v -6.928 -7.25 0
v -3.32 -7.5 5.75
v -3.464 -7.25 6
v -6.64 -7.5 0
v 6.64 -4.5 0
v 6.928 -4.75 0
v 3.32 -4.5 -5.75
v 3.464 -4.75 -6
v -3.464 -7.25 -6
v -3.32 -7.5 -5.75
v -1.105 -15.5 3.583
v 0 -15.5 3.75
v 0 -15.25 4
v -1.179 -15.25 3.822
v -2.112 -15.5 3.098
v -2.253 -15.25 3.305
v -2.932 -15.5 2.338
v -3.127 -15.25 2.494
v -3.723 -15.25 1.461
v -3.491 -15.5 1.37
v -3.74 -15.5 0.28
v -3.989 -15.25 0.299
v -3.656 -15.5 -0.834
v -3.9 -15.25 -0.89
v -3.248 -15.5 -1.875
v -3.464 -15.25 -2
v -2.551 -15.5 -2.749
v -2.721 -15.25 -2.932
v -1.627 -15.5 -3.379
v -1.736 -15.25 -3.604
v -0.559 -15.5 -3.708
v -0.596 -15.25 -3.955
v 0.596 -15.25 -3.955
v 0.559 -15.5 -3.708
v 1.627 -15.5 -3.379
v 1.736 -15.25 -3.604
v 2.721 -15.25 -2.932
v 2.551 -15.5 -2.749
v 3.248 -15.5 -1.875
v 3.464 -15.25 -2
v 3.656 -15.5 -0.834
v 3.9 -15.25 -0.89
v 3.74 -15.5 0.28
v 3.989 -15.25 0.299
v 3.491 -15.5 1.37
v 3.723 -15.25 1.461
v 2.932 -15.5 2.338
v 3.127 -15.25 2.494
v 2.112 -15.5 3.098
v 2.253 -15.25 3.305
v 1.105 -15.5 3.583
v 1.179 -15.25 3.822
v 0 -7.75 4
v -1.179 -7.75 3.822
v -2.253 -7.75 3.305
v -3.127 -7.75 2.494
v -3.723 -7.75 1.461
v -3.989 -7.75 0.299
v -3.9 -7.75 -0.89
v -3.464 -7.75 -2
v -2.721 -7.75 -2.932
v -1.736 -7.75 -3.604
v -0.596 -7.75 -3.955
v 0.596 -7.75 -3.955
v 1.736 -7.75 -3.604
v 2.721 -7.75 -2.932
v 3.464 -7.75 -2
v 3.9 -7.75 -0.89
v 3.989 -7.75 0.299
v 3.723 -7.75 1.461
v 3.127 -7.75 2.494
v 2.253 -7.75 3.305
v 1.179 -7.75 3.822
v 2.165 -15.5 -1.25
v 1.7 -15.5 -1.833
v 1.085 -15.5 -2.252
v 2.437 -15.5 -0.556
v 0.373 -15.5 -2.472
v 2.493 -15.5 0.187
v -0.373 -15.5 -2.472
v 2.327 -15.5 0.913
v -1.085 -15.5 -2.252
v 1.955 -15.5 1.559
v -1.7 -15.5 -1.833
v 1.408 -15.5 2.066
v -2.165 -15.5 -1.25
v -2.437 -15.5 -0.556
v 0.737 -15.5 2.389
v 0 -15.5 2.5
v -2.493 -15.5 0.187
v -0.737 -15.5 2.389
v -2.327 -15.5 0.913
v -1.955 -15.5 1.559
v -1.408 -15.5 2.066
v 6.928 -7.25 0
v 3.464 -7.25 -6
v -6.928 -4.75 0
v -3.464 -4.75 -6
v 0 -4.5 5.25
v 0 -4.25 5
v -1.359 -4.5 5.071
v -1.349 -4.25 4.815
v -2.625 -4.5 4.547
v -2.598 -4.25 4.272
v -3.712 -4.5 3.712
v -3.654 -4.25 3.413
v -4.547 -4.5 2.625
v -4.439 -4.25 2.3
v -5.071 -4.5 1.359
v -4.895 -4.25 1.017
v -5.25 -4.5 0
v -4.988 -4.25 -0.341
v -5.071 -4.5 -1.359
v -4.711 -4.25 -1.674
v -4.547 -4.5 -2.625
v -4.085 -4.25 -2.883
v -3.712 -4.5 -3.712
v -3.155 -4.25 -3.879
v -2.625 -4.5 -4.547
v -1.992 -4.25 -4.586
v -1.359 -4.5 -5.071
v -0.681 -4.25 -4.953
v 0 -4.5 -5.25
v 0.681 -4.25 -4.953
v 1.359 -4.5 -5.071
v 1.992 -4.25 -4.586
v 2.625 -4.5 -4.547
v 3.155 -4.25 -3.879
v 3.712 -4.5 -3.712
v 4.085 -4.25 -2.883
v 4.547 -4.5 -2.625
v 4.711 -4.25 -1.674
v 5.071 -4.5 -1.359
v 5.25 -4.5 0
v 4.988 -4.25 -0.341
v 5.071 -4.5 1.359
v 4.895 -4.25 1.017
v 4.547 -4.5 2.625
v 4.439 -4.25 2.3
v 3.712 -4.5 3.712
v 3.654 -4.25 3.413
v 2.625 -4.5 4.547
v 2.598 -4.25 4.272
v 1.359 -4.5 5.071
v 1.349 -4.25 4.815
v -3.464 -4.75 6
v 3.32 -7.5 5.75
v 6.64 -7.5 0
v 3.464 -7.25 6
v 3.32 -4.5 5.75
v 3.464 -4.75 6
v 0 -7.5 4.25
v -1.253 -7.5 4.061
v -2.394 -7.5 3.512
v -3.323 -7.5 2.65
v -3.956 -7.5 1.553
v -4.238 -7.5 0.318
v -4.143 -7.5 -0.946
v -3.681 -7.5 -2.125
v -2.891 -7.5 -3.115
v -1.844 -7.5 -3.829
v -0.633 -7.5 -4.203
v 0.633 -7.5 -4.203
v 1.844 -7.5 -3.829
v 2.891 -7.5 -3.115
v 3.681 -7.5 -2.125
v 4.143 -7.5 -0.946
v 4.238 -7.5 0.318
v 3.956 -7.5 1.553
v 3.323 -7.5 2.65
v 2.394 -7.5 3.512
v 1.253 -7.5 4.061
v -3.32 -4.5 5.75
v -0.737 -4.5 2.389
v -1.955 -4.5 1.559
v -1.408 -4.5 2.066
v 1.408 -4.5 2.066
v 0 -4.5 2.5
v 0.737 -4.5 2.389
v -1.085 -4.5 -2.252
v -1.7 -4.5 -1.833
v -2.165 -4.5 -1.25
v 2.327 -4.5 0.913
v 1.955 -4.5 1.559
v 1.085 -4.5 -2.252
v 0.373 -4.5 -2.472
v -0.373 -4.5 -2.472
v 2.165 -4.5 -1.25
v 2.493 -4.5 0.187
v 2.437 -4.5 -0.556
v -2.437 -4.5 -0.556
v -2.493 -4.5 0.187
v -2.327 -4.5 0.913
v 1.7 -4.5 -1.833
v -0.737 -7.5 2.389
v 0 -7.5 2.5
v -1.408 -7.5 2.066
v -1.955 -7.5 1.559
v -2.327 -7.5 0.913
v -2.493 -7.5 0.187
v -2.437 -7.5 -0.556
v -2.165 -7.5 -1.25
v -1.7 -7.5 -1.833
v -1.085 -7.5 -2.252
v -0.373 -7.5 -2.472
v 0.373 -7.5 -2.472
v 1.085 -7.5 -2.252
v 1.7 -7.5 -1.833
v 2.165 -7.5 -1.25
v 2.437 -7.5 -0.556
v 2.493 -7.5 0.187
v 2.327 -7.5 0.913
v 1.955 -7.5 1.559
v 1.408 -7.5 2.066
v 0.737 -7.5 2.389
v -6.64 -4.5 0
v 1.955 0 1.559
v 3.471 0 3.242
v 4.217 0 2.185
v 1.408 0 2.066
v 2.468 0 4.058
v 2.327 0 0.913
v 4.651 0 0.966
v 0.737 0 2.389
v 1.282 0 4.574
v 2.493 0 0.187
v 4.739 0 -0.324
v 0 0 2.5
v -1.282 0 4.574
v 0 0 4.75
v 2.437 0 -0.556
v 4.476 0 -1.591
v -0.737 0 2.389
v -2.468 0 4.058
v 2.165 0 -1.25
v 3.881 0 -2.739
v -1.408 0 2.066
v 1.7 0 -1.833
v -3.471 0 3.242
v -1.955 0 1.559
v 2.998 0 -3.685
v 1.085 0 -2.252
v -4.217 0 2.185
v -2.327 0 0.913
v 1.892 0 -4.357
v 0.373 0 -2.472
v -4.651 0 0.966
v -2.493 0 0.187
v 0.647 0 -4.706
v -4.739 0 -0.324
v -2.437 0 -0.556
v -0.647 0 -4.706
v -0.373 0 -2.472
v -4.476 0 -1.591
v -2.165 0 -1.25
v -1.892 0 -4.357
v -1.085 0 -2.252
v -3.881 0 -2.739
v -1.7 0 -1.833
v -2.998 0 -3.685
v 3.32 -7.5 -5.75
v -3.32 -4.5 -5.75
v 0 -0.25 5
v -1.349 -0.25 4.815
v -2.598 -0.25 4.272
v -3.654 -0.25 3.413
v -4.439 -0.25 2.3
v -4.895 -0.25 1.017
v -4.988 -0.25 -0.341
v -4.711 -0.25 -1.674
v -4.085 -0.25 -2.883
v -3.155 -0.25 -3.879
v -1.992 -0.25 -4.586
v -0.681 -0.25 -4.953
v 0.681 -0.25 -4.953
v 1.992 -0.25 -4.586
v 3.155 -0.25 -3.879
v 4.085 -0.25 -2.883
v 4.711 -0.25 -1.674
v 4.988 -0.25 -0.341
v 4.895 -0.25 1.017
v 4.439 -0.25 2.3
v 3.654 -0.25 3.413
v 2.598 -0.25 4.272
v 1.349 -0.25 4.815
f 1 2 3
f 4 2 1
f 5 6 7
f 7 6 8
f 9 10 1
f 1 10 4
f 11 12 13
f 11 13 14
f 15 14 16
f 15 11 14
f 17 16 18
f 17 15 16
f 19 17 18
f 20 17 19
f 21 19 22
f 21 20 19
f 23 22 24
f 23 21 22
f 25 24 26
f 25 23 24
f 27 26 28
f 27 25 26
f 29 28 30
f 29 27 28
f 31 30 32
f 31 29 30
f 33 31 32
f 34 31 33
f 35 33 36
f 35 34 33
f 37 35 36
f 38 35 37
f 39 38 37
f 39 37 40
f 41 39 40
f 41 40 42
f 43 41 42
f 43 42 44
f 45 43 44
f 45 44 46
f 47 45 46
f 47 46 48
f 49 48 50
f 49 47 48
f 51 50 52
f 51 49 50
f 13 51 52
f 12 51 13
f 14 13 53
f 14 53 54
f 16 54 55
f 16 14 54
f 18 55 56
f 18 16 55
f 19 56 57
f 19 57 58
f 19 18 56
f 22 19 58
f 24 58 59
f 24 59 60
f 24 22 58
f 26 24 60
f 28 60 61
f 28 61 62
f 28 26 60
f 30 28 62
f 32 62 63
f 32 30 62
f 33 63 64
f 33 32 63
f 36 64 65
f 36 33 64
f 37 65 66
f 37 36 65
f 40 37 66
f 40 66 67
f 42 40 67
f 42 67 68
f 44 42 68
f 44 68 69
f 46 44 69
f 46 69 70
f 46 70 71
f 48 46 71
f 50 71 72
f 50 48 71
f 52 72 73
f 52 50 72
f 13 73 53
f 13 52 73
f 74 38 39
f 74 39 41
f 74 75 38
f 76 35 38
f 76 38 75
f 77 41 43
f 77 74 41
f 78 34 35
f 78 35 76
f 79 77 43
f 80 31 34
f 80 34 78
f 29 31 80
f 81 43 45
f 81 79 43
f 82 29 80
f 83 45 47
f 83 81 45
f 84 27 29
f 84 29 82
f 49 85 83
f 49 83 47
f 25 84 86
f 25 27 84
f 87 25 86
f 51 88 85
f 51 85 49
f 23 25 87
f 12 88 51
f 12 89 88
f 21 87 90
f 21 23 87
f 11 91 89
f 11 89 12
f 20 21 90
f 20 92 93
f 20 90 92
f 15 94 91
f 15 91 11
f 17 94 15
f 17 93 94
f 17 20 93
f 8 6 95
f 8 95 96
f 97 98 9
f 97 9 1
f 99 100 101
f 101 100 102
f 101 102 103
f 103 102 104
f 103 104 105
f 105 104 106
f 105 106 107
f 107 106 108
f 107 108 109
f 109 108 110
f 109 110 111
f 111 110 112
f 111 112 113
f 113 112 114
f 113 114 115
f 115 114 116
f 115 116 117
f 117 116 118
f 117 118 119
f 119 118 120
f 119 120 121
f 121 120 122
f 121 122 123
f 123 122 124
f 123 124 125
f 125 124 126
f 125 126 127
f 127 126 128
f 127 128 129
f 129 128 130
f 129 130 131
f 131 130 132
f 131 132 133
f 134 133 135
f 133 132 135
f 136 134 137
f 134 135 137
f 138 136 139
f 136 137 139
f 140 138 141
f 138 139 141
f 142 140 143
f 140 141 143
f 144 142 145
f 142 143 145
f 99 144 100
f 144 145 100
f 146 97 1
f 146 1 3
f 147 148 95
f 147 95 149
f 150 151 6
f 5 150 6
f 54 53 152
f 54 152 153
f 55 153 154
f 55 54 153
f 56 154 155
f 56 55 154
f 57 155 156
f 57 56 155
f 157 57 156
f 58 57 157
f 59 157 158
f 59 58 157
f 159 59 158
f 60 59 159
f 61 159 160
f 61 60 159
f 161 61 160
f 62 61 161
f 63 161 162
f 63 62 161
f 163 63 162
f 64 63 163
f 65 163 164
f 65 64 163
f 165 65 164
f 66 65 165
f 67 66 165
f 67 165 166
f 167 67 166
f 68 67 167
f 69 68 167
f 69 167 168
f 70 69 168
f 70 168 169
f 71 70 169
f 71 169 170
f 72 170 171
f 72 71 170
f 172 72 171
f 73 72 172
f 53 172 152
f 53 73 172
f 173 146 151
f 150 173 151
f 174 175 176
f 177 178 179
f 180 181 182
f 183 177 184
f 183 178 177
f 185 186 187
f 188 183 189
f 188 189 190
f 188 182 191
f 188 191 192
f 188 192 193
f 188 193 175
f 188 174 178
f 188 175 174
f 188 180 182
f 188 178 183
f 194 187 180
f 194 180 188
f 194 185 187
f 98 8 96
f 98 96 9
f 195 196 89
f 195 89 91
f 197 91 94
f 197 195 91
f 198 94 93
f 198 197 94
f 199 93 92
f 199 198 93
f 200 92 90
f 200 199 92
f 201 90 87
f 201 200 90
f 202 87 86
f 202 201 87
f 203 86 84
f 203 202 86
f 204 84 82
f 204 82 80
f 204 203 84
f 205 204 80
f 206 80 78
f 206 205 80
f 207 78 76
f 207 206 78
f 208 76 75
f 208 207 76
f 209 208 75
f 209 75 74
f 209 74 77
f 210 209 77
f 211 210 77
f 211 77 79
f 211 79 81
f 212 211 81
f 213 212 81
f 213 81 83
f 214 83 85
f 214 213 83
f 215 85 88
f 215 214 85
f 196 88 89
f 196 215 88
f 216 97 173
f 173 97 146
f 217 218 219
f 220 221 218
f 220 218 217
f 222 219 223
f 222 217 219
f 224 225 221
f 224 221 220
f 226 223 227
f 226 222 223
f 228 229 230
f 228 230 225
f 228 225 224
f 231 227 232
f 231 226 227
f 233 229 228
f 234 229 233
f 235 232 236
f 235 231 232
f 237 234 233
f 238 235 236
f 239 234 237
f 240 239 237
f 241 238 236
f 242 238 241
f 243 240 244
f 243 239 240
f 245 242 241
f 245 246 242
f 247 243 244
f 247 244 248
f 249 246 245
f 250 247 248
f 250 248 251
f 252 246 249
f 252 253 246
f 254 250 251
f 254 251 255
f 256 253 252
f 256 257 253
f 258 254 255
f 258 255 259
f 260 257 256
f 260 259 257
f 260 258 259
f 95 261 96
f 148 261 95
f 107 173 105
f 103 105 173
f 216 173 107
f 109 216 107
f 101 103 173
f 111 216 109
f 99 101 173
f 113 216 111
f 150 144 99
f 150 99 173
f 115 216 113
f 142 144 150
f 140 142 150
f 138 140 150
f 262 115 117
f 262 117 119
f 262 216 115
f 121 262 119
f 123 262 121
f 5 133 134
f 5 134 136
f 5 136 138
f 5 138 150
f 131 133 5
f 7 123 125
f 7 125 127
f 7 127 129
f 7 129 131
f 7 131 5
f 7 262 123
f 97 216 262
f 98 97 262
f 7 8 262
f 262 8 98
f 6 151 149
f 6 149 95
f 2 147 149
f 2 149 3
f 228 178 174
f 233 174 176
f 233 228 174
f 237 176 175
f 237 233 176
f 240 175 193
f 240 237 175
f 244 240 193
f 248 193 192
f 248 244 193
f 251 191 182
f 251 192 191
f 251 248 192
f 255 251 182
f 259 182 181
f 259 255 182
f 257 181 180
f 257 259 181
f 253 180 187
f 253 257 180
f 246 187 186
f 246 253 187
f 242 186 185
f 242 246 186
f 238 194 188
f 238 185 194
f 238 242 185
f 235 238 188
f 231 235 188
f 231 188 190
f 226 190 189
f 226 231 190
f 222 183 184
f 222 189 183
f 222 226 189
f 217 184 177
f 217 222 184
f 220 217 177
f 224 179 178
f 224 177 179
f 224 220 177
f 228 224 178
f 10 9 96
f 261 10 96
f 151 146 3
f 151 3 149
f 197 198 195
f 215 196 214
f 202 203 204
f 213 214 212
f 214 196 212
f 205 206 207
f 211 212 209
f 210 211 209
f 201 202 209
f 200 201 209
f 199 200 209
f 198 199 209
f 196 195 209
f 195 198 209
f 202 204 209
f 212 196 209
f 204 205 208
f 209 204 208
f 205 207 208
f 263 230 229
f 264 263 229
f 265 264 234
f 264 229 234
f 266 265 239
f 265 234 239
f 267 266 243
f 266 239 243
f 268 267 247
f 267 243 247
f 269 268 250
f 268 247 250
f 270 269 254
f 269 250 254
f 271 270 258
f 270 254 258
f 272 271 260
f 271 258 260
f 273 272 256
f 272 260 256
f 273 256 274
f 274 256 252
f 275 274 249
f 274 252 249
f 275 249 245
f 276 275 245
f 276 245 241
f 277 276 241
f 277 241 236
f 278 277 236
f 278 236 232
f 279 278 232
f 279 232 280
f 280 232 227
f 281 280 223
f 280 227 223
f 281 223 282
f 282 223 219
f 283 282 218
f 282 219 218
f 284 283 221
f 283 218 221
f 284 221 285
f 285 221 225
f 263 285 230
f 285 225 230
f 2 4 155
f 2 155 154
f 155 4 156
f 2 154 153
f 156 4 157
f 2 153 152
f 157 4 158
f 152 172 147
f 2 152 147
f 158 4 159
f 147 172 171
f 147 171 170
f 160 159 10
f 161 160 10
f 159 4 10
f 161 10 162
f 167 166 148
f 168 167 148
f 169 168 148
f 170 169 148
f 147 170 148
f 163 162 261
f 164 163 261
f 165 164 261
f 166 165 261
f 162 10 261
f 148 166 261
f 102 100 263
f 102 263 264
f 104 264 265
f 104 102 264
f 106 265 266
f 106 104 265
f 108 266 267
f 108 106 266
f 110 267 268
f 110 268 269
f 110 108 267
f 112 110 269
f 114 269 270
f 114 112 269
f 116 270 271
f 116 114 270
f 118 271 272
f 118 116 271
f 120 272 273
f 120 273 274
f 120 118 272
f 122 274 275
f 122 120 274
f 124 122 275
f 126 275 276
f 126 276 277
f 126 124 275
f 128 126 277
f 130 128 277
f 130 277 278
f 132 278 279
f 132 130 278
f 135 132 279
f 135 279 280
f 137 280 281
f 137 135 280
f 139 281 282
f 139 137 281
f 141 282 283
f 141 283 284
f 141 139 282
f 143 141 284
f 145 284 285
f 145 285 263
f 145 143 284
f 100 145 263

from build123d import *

# Parameters (mm, degrees)
BOSS_EXTRUDE1_DEPTH = 3
CHAMFER1_SIZE       = 0.25


with BuildPart() as part:
    # Sketch3 → Revolve1 (revolve)
    with BuildSketch(Plane.XY, mode=Mode.PRIVATE) as revolve1_sk:
        Polygon((-5, 0), (-5, -4.5), (-6, -4.5), (-6, -7.5), (-4, -7.5), (-4, -15.5), (-2.5, -15.5), (-2.5, 0), align=None)
    revolve(revolve1_sk.sketch.rotate(Axis((0, 0, 0), (0, -1, 0)), 270), axis=Axis((0, 0, 0), (0, -1, 0)))

    # Sketch4 → Boss-Extrude1 (add)
    with BuildSketch(Plane(origin=(0, -4.5, 0), x_dir=(1, 0, 0), z_dir=(0, 1, 0))):
        Polygon((-3.464101615, 6), (-6.92820323, 0), (-3.464101615, -6), (3.464101615, -6), (6.92820323, 0), (3.464101615, 6), align=None)
    extrude(amount=-BOSS_EXTRUDE1_DEPTH)

    # Chamfer1
    chamfer1_edges = [part.edges().sort_by_distance(p)[0] for p in [
        (0, -4.5, 6),
        (-5.196152423, -4.5, 3),
        (-5.196152423, -4.5, -3),
        (0, -4.5, -6),
        (5.196152423, -4.5, -3),
        (5.196152423, -4.5, 3),
        (-5.196152423, -7.5, -3),
        (-5.196152423, -7.5, 3),
        (0, -7.5, 6),
        (5.196152423, -7.5, 3),
        (5.196152423, -7.5, -3),
        (0, -7.5, -6),
        (0, -15.5, -4),
        (0, -7.5, -4),
        (0, -4.5, -5),
        (0, 0, -5),
    ]]
    chamfer(chamfer1_edges, length=CHAMFER1_SIZE)


solid = part.part
